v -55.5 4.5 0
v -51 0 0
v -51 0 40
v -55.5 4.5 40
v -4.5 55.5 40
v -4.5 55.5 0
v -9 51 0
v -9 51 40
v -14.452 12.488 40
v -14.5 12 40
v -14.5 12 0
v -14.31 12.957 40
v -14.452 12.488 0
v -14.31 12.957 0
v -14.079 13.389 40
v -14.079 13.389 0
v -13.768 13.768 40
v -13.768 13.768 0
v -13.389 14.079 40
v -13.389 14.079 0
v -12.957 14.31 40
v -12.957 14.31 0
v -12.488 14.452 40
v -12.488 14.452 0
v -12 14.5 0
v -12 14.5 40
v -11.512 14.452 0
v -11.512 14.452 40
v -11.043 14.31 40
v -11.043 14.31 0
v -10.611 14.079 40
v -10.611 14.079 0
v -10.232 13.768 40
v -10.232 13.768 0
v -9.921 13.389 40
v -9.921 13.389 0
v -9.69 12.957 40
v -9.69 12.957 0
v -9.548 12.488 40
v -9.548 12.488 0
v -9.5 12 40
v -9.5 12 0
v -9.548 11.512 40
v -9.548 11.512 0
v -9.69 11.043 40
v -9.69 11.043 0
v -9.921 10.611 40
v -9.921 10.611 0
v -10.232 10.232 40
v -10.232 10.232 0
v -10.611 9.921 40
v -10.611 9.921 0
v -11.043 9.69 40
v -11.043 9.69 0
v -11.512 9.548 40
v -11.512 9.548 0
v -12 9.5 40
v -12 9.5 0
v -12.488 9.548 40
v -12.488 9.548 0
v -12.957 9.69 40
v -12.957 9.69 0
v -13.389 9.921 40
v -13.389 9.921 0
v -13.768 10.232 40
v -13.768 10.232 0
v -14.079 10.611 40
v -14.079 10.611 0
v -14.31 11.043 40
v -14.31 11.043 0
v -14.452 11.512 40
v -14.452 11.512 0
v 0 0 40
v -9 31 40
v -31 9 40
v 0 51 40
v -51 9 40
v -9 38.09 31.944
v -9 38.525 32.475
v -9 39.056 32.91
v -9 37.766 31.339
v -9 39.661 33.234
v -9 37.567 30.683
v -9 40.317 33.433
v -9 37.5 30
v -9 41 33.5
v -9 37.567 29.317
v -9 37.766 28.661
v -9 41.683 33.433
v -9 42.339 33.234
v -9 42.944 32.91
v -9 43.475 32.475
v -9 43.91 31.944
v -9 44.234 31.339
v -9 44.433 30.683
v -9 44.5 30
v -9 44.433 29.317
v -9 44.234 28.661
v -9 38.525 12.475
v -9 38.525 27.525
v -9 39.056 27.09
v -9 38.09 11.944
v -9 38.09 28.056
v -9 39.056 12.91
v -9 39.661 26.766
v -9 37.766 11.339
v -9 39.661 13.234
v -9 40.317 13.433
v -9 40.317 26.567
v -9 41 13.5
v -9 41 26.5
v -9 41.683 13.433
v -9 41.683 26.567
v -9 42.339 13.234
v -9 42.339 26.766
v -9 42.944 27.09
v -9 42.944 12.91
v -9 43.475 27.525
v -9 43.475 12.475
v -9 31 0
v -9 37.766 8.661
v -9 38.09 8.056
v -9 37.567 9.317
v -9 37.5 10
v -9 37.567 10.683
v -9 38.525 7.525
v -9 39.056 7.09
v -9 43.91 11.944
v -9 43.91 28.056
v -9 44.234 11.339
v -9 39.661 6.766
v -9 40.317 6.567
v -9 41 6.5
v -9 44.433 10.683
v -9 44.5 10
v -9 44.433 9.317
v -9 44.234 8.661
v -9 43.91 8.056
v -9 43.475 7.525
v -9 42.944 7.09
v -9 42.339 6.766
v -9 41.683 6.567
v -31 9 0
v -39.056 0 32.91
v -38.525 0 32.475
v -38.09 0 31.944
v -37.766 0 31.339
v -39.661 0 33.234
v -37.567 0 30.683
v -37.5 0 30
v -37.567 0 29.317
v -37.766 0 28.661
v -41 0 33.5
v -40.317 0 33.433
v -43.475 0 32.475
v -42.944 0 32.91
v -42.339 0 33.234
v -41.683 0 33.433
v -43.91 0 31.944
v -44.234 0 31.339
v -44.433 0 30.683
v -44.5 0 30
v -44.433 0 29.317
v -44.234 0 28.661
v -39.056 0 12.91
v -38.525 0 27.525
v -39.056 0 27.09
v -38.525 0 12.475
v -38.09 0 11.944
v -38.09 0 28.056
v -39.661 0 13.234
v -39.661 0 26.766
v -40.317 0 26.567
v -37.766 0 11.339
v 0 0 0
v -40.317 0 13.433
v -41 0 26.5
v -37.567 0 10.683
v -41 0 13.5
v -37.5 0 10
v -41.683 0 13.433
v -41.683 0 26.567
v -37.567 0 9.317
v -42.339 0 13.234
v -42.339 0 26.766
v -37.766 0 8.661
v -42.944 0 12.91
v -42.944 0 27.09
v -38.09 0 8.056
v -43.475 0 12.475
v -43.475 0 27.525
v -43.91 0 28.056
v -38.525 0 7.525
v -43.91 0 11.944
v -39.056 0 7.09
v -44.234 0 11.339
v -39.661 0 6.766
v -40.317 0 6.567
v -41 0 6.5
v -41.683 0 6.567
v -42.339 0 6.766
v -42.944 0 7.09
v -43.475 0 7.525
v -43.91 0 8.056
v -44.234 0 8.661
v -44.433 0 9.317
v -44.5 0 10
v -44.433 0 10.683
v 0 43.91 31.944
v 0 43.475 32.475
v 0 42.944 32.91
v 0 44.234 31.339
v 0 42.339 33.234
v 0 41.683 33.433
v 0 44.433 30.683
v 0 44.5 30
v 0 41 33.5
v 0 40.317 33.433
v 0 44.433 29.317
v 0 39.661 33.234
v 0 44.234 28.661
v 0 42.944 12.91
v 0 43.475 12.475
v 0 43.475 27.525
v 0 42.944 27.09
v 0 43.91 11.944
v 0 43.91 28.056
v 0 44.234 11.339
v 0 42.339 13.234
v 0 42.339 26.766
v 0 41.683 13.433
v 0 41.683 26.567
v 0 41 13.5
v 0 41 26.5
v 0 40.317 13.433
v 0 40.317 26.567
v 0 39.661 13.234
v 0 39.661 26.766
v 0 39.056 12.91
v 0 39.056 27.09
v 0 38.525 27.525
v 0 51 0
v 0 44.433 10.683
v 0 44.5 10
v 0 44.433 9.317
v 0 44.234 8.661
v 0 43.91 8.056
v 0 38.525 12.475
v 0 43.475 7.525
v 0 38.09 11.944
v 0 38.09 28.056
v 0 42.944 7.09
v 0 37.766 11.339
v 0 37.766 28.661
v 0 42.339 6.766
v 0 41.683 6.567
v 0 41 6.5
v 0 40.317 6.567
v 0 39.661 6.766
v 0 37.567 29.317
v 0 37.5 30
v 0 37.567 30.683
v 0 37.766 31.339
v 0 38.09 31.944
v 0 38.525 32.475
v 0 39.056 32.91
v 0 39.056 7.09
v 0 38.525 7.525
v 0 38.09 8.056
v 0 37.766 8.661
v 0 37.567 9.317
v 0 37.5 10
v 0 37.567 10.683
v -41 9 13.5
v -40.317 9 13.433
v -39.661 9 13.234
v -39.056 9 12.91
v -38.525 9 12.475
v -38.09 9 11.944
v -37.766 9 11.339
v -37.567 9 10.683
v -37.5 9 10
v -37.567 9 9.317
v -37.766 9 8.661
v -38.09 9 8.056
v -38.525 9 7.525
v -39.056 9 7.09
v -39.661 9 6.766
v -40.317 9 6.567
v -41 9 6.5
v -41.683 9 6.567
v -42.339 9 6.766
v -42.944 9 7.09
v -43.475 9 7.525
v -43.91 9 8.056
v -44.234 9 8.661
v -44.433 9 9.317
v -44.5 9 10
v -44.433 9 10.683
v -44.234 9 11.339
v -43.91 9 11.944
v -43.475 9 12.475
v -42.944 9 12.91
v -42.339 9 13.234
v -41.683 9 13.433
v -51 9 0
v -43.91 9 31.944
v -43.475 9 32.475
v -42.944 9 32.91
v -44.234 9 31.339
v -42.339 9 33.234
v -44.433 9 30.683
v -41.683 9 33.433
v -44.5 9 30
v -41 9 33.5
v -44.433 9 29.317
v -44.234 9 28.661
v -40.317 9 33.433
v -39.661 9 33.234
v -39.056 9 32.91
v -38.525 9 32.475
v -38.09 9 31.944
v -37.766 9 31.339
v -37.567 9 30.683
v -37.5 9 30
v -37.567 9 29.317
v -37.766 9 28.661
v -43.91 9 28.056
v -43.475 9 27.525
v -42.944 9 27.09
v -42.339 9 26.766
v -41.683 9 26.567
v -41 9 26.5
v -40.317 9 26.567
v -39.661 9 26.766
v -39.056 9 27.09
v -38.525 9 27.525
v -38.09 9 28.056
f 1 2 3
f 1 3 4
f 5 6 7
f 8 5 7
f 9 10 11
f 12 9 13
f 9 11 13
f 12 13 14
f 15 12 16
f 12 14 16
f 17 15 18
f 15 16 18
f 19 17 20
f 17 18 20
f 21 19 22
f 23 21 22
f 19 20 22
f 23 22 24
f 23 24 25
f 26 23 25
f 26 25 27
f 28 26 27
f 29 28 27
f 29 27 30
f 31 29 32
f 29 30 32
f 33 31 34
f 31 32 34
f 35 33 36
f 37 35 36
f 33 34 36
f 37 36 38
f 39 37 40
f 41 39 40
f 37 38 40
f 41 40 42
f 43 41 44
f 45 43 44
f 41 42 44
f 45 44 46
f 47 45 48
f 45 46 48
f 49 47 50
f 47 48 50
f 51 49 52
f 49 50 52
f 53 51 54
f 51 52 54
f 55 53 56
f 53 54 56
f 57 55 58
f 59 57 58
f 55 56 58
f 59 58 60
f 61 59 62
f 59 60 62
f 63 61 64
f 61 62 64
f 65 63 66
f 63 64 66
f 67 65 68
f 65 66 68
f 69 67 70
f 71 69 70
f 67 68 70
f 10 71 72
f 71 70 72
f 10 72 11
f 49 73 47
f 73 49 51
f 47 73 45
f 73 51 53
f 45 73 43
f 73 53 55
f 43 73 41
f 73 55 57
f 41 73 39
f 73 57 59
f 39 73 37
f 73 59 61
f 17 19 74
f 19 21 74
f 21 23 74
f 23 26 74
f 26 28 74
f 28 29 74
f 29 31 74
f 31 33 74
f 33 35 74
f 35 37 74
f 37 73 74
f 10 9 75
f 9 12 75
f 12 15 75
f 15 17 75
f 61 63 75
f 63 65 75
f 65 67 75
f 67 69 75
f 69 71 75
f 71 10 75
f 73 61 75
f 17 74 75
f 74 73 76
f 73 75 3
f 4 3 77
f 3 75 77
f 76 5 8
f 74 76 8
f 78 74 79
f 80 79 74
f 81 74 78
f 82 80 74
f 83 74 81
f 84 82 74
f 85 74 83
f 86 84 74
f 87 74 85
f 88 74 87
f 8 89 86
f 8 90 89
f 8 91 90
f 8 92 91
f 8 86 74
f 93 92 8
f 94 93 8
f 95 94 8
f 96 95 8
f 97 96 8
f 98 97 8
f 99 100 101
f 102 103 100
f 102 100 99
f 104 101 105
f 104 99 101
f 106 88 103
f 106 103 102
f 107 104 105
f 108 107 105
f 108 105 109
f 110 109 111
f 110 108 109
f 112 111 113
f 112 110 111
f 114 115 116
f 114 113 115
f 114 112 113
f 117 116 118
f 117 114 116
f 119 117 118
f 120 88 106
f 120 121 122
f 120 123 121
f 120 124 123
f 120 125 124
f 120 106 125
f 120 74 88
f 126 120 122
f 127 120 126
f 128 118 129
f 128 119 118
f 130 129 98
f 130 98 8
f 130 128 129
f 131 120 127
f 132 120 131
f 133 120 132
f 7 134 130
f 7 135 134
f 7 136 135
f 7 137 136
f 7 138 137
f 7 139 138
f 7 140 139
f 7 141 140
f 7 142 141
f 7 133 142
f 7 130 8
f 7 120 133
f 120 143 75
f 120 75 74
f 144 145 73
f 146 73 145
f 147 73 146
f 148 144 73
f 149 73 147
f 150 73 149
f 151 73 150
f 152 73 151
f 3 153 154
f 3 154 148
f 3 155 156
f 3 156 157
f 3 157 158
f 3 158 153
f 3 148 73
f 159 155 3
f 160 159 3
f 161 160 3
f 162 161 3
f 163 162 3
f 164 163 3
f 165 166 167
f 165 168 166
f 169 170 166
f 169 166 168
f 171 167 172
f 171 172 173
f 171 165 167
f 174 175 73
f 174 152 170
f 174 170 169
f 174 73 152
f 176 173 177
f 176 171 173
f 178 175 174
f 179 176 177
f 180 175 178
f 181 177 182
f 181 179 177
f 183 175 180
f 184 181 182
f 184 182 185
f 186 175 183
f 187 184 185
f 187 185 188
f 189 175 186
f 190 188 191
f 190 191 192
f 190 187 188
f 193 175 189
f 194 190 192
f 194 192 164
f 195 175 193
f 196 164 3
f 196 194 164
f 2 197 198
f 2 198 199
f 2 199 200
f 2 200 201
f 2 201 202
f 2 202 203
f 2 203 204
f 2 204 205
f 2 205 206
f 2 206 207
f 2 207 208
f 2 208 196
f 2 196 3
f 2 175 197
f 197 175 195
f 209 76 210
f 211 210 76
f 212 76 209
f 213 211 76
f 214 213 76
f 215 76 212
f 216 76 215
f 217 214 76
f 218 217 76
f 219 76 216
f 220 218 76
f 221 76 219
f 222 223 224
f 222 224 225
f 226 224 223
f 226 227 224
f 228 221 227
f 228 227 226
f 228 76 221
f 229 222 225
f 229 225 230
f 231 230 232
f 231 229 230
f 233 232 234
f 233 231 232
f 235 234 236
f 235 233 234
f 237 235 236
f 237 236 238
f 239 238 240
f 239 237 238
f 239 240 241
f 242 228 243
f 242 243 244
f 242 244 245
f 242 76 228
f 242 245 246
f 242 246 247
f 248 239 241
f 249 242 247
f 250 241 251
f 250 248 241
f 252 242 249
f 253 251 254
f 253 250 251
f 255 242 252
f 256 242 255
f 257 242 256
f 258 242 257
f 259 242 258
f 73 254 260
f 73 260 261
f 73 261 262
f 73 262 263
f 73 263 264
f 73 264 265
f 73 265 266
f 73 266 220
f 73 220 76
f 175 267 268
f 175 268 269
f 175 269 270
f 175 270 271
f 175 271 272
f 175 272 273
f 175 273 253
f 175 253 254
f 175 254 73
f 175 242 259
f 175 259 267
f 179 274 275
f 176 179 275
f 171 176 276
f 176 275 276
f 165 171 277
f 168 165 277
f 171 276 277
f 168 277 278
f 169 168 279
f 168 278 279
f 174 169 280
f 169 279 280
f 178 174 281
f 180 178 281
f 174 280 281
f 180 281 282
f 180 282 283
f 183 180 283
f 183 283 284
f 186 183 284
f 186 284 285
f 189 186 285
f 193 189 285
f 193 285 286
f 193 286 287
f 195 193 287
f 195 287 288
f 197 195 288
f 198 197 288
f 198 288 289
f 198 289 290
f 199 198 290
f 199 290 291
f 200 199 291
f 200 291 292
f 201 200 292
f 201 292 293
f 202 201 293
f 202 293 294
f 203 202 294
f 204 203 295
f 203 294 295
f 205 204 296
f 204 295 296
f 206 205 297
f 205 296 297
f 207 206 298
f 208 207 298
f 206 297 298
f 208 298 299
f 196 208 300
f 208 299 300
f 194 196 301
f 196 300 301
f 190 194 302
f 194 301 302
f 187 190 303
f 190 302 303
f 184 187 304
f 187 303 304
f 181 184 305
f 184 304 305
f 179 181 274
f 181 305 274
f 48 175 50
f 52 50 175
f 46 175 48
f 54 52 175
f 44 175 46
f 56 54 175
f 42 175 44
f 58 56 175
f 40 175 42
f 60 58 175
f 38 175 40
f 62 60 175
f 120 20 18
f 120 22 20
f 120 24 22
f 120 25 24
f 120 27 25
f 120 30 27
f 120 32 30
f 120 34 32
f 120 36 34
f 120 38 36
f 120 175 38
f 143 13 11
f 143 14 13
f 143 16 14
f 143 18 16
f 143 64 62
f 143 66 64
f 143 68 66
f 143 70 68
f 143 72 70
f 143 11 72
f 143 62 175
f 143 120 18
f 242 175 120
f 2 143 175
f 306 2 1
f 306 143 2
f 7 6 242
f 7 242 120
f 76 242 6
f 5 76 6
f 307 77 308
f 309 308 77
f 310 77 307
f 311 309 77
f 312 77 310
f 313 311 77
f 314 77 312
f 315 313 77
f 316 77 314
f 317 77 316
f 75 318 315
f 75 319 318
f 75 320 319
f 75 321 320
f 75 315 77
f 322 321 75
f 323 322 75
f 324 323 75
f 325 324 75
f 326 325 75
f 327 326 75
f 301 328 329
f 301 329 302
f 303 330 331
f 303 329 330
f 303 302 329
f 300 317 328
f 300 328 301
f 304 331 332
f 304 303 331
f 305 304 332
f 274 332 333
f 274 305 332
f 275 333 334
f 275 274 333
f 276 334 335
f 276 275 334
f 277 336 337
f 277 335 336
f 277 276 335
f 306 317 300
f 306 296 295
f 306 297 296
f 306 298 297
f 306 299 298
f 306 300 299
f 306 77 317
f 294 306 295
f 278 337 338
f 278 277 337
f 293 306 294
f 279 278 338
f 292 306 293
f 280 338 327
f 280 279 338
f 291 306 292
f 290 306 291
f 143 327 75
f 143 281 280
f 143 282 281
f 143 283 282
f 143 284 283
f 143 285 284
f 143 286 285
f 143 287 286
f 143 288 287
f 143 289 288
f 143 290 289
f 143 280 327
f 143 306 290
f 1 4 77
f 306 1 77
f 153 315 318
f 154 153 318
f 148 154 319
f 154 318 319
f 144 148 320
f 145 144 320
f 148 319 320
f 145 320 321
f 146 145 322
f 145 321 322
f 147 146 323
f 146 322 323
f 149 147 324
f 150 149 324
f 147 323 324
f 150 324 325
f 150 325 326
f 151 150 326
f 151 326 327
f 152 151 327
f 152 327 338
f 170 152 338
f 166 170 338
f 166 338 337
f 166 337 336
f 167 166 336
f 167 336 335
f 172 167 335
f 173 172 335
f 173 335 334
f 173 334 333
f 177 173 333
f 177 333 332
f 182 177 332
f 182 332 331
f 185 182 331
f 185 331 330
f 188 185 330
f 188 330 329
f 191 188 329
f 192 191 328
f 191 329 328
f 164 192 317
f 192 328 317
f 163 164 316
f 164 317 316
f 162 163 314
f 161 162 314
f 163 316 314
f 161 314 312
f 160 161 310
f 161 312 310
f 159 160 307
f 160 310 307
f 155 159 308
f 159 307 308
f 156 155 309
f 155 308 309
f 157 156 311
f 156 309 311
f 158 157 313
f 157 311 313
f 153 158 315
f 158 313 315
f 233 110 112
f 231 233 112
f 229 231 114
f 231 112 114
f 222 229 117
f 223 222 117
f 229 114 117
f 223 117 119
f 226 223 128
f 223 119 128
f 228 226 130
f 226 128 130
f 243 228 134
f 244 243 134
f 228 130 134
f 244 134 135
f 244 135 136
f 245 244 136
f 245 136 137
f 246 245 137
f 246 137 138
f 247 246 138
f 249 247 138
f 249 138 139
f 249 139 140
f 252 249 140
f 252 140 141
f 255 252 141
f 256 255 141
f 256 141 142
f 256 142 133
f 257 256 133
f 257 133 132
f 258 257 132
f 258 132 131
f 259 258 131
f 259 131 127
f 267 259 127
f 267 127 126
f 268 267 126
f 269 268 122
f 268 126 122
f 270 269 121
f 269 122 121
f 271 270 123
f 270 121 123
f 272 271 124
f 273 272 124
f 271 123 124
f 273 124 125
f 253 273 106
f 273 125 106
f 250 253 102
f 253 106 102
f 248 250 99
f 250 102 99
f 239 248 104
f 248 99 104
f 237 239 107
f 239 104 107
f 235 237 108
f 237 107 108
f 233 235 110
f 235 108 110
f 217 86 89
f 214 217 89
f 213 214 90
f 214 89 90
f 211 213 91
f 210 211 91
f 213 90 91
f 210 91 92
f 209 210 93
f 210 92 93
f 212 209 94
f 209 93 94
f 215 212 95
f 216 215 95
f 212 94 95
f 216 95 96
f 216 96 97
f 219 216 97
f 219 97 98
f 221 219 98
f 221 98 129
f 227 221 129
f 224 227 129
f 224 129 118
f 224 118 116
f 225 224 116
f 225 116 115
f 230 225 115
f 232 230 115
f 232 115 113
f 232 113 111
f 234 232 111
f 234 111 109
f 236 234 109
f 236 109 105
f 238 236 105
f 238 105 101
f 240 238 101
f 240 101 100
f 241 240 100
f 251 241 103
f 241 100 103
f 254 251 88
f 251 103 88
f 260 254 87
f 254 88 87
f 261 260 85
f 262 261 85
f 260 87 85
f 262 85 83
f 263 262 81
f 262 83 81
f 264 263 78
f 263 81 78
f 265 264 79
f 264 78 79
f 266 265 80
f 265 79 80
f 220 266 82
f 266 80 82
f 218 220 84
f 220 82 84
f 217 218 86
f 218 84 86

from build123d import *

# Parameters (mm, degrees)
BOSS_EXTRUDE1_DEPTH = 40
SKETCH2_R           = 3.5
CUT_EXTRUDE1_DEPTH  = 84.3366666
SKETCH3_R           = 3.5
CUT_EXTRUDE2_DEPTH  = 40
CHAMFER1_SIZE       = 5
SKETCH4_R           = 2.5
CUT_EXTRUDE3_DEPTH  = 40


with BuildPart() as part:
    # Sketch1 → Boss-Extrude1 (new body)
    with BuildSketch(Plane.XY):
        Polygon((0, 56), (0, 0), (-56, 0), (-56, 9), (-31, 9), (-9, 31), (-9, 56), align=None)
    extrude(amount=BOSS_EXTRUDE1_DEPTH)

    # Sketch2 → Cut-Extrude1 (cut, through all)
    with BuildSketch(Plane.ZY.offset(9)):
        with Locations((10, 41)):
            Circle(SKETCH2_R)
        with Locations((30, 41)):
            Circle(SKETCH2_R)
    extrude(amount=-CUT_EXTRUDE1_DEPTH, mode=Mode.SUBTRACT)

    # Sketch3 → Cut-Extrude2 (cut)
    with BuildSketch(Plane(origin=(0, 9, 0), x_dir=(1, 0, 0), z_dir=(0, 1, 0))):
        with Locations(Location((-41, -10, 0), (0, 0, 270))):
            Circle(SKETCH3_R)
        with Locations(Location((-41, -30, 0), (0, 0, 270))):
            Circle(SKETCH3_R)
    extrude(amount=-CUT_EXTRUDE2_DEPTH, mode=Mode.SUBTRACT)

    # Chamfer1
    # the kernel refuses this chamfer: 5 mm, written as the material it takes off along each edge
    with BuildSketch(Plane(origin=(-56, 0, -12.85841494), x_dir=(0.9996219169112968, -0.027495876610586254, 0), z_dir=(0, 0, 1)), Plane(origin=(-56, 9, -12.85841494), x_dir=(-0.027495876610586317, -0.9996219169112968, 0), z_dir=(0, 0, 1))) as chamfer1_piece_1:
        Polygon((CHAMFER1_SIZE * 0.999621916911, CHAMFER1_SIZE * 0.0274958766106), (-CHAMFER1_SIZE * 0.0274958766106, CHAMFER1_SIZE * 0.999621916911), (0, 0), align=None)
    extrude(amount=65.71682988, mode=Mode.SUBTRACT)
    with BuildSketch(Plane(origin=(0, 56, -12.85841494), x_dir=(0.02749587661058641, -0.9996219169112968, 0), z_dir=(0, 0, 1)), Plane(origin=(-9, 56, -12.85841494), x_dir=(0.9996219169112968, 0.027495876610586317, 0), z_dir=(0, 0, 1))) as chamfer1_piece_2:
        Polygon((CHAMFER1_SIZE * 0.999621916911, -CHAMFER1_SIZE * 0.0274958766106), (-CHAMFER1_SIZE * 0.0274958766106, -CHAMFER1_SIZE * 0.999621916911), (0, 0), align=None)
    extrude(amount=65.71682988, mode=Mode.SUBTRACT)

    # Sketch4 → Cut-Extrude3 (cut)
    with BuildSketch(Plane(origin=(0, 0, 0), x_dir=(-1, 0, 0), z_dir=(0, 0, -1))):
        with Locations((12, 12)):
            Circle(SKETCH4_R)
    extrude(amount=-CUT_EXTRUDE3_DEPTH, mode=Mode.SUBTRACT)


solid = part.part
